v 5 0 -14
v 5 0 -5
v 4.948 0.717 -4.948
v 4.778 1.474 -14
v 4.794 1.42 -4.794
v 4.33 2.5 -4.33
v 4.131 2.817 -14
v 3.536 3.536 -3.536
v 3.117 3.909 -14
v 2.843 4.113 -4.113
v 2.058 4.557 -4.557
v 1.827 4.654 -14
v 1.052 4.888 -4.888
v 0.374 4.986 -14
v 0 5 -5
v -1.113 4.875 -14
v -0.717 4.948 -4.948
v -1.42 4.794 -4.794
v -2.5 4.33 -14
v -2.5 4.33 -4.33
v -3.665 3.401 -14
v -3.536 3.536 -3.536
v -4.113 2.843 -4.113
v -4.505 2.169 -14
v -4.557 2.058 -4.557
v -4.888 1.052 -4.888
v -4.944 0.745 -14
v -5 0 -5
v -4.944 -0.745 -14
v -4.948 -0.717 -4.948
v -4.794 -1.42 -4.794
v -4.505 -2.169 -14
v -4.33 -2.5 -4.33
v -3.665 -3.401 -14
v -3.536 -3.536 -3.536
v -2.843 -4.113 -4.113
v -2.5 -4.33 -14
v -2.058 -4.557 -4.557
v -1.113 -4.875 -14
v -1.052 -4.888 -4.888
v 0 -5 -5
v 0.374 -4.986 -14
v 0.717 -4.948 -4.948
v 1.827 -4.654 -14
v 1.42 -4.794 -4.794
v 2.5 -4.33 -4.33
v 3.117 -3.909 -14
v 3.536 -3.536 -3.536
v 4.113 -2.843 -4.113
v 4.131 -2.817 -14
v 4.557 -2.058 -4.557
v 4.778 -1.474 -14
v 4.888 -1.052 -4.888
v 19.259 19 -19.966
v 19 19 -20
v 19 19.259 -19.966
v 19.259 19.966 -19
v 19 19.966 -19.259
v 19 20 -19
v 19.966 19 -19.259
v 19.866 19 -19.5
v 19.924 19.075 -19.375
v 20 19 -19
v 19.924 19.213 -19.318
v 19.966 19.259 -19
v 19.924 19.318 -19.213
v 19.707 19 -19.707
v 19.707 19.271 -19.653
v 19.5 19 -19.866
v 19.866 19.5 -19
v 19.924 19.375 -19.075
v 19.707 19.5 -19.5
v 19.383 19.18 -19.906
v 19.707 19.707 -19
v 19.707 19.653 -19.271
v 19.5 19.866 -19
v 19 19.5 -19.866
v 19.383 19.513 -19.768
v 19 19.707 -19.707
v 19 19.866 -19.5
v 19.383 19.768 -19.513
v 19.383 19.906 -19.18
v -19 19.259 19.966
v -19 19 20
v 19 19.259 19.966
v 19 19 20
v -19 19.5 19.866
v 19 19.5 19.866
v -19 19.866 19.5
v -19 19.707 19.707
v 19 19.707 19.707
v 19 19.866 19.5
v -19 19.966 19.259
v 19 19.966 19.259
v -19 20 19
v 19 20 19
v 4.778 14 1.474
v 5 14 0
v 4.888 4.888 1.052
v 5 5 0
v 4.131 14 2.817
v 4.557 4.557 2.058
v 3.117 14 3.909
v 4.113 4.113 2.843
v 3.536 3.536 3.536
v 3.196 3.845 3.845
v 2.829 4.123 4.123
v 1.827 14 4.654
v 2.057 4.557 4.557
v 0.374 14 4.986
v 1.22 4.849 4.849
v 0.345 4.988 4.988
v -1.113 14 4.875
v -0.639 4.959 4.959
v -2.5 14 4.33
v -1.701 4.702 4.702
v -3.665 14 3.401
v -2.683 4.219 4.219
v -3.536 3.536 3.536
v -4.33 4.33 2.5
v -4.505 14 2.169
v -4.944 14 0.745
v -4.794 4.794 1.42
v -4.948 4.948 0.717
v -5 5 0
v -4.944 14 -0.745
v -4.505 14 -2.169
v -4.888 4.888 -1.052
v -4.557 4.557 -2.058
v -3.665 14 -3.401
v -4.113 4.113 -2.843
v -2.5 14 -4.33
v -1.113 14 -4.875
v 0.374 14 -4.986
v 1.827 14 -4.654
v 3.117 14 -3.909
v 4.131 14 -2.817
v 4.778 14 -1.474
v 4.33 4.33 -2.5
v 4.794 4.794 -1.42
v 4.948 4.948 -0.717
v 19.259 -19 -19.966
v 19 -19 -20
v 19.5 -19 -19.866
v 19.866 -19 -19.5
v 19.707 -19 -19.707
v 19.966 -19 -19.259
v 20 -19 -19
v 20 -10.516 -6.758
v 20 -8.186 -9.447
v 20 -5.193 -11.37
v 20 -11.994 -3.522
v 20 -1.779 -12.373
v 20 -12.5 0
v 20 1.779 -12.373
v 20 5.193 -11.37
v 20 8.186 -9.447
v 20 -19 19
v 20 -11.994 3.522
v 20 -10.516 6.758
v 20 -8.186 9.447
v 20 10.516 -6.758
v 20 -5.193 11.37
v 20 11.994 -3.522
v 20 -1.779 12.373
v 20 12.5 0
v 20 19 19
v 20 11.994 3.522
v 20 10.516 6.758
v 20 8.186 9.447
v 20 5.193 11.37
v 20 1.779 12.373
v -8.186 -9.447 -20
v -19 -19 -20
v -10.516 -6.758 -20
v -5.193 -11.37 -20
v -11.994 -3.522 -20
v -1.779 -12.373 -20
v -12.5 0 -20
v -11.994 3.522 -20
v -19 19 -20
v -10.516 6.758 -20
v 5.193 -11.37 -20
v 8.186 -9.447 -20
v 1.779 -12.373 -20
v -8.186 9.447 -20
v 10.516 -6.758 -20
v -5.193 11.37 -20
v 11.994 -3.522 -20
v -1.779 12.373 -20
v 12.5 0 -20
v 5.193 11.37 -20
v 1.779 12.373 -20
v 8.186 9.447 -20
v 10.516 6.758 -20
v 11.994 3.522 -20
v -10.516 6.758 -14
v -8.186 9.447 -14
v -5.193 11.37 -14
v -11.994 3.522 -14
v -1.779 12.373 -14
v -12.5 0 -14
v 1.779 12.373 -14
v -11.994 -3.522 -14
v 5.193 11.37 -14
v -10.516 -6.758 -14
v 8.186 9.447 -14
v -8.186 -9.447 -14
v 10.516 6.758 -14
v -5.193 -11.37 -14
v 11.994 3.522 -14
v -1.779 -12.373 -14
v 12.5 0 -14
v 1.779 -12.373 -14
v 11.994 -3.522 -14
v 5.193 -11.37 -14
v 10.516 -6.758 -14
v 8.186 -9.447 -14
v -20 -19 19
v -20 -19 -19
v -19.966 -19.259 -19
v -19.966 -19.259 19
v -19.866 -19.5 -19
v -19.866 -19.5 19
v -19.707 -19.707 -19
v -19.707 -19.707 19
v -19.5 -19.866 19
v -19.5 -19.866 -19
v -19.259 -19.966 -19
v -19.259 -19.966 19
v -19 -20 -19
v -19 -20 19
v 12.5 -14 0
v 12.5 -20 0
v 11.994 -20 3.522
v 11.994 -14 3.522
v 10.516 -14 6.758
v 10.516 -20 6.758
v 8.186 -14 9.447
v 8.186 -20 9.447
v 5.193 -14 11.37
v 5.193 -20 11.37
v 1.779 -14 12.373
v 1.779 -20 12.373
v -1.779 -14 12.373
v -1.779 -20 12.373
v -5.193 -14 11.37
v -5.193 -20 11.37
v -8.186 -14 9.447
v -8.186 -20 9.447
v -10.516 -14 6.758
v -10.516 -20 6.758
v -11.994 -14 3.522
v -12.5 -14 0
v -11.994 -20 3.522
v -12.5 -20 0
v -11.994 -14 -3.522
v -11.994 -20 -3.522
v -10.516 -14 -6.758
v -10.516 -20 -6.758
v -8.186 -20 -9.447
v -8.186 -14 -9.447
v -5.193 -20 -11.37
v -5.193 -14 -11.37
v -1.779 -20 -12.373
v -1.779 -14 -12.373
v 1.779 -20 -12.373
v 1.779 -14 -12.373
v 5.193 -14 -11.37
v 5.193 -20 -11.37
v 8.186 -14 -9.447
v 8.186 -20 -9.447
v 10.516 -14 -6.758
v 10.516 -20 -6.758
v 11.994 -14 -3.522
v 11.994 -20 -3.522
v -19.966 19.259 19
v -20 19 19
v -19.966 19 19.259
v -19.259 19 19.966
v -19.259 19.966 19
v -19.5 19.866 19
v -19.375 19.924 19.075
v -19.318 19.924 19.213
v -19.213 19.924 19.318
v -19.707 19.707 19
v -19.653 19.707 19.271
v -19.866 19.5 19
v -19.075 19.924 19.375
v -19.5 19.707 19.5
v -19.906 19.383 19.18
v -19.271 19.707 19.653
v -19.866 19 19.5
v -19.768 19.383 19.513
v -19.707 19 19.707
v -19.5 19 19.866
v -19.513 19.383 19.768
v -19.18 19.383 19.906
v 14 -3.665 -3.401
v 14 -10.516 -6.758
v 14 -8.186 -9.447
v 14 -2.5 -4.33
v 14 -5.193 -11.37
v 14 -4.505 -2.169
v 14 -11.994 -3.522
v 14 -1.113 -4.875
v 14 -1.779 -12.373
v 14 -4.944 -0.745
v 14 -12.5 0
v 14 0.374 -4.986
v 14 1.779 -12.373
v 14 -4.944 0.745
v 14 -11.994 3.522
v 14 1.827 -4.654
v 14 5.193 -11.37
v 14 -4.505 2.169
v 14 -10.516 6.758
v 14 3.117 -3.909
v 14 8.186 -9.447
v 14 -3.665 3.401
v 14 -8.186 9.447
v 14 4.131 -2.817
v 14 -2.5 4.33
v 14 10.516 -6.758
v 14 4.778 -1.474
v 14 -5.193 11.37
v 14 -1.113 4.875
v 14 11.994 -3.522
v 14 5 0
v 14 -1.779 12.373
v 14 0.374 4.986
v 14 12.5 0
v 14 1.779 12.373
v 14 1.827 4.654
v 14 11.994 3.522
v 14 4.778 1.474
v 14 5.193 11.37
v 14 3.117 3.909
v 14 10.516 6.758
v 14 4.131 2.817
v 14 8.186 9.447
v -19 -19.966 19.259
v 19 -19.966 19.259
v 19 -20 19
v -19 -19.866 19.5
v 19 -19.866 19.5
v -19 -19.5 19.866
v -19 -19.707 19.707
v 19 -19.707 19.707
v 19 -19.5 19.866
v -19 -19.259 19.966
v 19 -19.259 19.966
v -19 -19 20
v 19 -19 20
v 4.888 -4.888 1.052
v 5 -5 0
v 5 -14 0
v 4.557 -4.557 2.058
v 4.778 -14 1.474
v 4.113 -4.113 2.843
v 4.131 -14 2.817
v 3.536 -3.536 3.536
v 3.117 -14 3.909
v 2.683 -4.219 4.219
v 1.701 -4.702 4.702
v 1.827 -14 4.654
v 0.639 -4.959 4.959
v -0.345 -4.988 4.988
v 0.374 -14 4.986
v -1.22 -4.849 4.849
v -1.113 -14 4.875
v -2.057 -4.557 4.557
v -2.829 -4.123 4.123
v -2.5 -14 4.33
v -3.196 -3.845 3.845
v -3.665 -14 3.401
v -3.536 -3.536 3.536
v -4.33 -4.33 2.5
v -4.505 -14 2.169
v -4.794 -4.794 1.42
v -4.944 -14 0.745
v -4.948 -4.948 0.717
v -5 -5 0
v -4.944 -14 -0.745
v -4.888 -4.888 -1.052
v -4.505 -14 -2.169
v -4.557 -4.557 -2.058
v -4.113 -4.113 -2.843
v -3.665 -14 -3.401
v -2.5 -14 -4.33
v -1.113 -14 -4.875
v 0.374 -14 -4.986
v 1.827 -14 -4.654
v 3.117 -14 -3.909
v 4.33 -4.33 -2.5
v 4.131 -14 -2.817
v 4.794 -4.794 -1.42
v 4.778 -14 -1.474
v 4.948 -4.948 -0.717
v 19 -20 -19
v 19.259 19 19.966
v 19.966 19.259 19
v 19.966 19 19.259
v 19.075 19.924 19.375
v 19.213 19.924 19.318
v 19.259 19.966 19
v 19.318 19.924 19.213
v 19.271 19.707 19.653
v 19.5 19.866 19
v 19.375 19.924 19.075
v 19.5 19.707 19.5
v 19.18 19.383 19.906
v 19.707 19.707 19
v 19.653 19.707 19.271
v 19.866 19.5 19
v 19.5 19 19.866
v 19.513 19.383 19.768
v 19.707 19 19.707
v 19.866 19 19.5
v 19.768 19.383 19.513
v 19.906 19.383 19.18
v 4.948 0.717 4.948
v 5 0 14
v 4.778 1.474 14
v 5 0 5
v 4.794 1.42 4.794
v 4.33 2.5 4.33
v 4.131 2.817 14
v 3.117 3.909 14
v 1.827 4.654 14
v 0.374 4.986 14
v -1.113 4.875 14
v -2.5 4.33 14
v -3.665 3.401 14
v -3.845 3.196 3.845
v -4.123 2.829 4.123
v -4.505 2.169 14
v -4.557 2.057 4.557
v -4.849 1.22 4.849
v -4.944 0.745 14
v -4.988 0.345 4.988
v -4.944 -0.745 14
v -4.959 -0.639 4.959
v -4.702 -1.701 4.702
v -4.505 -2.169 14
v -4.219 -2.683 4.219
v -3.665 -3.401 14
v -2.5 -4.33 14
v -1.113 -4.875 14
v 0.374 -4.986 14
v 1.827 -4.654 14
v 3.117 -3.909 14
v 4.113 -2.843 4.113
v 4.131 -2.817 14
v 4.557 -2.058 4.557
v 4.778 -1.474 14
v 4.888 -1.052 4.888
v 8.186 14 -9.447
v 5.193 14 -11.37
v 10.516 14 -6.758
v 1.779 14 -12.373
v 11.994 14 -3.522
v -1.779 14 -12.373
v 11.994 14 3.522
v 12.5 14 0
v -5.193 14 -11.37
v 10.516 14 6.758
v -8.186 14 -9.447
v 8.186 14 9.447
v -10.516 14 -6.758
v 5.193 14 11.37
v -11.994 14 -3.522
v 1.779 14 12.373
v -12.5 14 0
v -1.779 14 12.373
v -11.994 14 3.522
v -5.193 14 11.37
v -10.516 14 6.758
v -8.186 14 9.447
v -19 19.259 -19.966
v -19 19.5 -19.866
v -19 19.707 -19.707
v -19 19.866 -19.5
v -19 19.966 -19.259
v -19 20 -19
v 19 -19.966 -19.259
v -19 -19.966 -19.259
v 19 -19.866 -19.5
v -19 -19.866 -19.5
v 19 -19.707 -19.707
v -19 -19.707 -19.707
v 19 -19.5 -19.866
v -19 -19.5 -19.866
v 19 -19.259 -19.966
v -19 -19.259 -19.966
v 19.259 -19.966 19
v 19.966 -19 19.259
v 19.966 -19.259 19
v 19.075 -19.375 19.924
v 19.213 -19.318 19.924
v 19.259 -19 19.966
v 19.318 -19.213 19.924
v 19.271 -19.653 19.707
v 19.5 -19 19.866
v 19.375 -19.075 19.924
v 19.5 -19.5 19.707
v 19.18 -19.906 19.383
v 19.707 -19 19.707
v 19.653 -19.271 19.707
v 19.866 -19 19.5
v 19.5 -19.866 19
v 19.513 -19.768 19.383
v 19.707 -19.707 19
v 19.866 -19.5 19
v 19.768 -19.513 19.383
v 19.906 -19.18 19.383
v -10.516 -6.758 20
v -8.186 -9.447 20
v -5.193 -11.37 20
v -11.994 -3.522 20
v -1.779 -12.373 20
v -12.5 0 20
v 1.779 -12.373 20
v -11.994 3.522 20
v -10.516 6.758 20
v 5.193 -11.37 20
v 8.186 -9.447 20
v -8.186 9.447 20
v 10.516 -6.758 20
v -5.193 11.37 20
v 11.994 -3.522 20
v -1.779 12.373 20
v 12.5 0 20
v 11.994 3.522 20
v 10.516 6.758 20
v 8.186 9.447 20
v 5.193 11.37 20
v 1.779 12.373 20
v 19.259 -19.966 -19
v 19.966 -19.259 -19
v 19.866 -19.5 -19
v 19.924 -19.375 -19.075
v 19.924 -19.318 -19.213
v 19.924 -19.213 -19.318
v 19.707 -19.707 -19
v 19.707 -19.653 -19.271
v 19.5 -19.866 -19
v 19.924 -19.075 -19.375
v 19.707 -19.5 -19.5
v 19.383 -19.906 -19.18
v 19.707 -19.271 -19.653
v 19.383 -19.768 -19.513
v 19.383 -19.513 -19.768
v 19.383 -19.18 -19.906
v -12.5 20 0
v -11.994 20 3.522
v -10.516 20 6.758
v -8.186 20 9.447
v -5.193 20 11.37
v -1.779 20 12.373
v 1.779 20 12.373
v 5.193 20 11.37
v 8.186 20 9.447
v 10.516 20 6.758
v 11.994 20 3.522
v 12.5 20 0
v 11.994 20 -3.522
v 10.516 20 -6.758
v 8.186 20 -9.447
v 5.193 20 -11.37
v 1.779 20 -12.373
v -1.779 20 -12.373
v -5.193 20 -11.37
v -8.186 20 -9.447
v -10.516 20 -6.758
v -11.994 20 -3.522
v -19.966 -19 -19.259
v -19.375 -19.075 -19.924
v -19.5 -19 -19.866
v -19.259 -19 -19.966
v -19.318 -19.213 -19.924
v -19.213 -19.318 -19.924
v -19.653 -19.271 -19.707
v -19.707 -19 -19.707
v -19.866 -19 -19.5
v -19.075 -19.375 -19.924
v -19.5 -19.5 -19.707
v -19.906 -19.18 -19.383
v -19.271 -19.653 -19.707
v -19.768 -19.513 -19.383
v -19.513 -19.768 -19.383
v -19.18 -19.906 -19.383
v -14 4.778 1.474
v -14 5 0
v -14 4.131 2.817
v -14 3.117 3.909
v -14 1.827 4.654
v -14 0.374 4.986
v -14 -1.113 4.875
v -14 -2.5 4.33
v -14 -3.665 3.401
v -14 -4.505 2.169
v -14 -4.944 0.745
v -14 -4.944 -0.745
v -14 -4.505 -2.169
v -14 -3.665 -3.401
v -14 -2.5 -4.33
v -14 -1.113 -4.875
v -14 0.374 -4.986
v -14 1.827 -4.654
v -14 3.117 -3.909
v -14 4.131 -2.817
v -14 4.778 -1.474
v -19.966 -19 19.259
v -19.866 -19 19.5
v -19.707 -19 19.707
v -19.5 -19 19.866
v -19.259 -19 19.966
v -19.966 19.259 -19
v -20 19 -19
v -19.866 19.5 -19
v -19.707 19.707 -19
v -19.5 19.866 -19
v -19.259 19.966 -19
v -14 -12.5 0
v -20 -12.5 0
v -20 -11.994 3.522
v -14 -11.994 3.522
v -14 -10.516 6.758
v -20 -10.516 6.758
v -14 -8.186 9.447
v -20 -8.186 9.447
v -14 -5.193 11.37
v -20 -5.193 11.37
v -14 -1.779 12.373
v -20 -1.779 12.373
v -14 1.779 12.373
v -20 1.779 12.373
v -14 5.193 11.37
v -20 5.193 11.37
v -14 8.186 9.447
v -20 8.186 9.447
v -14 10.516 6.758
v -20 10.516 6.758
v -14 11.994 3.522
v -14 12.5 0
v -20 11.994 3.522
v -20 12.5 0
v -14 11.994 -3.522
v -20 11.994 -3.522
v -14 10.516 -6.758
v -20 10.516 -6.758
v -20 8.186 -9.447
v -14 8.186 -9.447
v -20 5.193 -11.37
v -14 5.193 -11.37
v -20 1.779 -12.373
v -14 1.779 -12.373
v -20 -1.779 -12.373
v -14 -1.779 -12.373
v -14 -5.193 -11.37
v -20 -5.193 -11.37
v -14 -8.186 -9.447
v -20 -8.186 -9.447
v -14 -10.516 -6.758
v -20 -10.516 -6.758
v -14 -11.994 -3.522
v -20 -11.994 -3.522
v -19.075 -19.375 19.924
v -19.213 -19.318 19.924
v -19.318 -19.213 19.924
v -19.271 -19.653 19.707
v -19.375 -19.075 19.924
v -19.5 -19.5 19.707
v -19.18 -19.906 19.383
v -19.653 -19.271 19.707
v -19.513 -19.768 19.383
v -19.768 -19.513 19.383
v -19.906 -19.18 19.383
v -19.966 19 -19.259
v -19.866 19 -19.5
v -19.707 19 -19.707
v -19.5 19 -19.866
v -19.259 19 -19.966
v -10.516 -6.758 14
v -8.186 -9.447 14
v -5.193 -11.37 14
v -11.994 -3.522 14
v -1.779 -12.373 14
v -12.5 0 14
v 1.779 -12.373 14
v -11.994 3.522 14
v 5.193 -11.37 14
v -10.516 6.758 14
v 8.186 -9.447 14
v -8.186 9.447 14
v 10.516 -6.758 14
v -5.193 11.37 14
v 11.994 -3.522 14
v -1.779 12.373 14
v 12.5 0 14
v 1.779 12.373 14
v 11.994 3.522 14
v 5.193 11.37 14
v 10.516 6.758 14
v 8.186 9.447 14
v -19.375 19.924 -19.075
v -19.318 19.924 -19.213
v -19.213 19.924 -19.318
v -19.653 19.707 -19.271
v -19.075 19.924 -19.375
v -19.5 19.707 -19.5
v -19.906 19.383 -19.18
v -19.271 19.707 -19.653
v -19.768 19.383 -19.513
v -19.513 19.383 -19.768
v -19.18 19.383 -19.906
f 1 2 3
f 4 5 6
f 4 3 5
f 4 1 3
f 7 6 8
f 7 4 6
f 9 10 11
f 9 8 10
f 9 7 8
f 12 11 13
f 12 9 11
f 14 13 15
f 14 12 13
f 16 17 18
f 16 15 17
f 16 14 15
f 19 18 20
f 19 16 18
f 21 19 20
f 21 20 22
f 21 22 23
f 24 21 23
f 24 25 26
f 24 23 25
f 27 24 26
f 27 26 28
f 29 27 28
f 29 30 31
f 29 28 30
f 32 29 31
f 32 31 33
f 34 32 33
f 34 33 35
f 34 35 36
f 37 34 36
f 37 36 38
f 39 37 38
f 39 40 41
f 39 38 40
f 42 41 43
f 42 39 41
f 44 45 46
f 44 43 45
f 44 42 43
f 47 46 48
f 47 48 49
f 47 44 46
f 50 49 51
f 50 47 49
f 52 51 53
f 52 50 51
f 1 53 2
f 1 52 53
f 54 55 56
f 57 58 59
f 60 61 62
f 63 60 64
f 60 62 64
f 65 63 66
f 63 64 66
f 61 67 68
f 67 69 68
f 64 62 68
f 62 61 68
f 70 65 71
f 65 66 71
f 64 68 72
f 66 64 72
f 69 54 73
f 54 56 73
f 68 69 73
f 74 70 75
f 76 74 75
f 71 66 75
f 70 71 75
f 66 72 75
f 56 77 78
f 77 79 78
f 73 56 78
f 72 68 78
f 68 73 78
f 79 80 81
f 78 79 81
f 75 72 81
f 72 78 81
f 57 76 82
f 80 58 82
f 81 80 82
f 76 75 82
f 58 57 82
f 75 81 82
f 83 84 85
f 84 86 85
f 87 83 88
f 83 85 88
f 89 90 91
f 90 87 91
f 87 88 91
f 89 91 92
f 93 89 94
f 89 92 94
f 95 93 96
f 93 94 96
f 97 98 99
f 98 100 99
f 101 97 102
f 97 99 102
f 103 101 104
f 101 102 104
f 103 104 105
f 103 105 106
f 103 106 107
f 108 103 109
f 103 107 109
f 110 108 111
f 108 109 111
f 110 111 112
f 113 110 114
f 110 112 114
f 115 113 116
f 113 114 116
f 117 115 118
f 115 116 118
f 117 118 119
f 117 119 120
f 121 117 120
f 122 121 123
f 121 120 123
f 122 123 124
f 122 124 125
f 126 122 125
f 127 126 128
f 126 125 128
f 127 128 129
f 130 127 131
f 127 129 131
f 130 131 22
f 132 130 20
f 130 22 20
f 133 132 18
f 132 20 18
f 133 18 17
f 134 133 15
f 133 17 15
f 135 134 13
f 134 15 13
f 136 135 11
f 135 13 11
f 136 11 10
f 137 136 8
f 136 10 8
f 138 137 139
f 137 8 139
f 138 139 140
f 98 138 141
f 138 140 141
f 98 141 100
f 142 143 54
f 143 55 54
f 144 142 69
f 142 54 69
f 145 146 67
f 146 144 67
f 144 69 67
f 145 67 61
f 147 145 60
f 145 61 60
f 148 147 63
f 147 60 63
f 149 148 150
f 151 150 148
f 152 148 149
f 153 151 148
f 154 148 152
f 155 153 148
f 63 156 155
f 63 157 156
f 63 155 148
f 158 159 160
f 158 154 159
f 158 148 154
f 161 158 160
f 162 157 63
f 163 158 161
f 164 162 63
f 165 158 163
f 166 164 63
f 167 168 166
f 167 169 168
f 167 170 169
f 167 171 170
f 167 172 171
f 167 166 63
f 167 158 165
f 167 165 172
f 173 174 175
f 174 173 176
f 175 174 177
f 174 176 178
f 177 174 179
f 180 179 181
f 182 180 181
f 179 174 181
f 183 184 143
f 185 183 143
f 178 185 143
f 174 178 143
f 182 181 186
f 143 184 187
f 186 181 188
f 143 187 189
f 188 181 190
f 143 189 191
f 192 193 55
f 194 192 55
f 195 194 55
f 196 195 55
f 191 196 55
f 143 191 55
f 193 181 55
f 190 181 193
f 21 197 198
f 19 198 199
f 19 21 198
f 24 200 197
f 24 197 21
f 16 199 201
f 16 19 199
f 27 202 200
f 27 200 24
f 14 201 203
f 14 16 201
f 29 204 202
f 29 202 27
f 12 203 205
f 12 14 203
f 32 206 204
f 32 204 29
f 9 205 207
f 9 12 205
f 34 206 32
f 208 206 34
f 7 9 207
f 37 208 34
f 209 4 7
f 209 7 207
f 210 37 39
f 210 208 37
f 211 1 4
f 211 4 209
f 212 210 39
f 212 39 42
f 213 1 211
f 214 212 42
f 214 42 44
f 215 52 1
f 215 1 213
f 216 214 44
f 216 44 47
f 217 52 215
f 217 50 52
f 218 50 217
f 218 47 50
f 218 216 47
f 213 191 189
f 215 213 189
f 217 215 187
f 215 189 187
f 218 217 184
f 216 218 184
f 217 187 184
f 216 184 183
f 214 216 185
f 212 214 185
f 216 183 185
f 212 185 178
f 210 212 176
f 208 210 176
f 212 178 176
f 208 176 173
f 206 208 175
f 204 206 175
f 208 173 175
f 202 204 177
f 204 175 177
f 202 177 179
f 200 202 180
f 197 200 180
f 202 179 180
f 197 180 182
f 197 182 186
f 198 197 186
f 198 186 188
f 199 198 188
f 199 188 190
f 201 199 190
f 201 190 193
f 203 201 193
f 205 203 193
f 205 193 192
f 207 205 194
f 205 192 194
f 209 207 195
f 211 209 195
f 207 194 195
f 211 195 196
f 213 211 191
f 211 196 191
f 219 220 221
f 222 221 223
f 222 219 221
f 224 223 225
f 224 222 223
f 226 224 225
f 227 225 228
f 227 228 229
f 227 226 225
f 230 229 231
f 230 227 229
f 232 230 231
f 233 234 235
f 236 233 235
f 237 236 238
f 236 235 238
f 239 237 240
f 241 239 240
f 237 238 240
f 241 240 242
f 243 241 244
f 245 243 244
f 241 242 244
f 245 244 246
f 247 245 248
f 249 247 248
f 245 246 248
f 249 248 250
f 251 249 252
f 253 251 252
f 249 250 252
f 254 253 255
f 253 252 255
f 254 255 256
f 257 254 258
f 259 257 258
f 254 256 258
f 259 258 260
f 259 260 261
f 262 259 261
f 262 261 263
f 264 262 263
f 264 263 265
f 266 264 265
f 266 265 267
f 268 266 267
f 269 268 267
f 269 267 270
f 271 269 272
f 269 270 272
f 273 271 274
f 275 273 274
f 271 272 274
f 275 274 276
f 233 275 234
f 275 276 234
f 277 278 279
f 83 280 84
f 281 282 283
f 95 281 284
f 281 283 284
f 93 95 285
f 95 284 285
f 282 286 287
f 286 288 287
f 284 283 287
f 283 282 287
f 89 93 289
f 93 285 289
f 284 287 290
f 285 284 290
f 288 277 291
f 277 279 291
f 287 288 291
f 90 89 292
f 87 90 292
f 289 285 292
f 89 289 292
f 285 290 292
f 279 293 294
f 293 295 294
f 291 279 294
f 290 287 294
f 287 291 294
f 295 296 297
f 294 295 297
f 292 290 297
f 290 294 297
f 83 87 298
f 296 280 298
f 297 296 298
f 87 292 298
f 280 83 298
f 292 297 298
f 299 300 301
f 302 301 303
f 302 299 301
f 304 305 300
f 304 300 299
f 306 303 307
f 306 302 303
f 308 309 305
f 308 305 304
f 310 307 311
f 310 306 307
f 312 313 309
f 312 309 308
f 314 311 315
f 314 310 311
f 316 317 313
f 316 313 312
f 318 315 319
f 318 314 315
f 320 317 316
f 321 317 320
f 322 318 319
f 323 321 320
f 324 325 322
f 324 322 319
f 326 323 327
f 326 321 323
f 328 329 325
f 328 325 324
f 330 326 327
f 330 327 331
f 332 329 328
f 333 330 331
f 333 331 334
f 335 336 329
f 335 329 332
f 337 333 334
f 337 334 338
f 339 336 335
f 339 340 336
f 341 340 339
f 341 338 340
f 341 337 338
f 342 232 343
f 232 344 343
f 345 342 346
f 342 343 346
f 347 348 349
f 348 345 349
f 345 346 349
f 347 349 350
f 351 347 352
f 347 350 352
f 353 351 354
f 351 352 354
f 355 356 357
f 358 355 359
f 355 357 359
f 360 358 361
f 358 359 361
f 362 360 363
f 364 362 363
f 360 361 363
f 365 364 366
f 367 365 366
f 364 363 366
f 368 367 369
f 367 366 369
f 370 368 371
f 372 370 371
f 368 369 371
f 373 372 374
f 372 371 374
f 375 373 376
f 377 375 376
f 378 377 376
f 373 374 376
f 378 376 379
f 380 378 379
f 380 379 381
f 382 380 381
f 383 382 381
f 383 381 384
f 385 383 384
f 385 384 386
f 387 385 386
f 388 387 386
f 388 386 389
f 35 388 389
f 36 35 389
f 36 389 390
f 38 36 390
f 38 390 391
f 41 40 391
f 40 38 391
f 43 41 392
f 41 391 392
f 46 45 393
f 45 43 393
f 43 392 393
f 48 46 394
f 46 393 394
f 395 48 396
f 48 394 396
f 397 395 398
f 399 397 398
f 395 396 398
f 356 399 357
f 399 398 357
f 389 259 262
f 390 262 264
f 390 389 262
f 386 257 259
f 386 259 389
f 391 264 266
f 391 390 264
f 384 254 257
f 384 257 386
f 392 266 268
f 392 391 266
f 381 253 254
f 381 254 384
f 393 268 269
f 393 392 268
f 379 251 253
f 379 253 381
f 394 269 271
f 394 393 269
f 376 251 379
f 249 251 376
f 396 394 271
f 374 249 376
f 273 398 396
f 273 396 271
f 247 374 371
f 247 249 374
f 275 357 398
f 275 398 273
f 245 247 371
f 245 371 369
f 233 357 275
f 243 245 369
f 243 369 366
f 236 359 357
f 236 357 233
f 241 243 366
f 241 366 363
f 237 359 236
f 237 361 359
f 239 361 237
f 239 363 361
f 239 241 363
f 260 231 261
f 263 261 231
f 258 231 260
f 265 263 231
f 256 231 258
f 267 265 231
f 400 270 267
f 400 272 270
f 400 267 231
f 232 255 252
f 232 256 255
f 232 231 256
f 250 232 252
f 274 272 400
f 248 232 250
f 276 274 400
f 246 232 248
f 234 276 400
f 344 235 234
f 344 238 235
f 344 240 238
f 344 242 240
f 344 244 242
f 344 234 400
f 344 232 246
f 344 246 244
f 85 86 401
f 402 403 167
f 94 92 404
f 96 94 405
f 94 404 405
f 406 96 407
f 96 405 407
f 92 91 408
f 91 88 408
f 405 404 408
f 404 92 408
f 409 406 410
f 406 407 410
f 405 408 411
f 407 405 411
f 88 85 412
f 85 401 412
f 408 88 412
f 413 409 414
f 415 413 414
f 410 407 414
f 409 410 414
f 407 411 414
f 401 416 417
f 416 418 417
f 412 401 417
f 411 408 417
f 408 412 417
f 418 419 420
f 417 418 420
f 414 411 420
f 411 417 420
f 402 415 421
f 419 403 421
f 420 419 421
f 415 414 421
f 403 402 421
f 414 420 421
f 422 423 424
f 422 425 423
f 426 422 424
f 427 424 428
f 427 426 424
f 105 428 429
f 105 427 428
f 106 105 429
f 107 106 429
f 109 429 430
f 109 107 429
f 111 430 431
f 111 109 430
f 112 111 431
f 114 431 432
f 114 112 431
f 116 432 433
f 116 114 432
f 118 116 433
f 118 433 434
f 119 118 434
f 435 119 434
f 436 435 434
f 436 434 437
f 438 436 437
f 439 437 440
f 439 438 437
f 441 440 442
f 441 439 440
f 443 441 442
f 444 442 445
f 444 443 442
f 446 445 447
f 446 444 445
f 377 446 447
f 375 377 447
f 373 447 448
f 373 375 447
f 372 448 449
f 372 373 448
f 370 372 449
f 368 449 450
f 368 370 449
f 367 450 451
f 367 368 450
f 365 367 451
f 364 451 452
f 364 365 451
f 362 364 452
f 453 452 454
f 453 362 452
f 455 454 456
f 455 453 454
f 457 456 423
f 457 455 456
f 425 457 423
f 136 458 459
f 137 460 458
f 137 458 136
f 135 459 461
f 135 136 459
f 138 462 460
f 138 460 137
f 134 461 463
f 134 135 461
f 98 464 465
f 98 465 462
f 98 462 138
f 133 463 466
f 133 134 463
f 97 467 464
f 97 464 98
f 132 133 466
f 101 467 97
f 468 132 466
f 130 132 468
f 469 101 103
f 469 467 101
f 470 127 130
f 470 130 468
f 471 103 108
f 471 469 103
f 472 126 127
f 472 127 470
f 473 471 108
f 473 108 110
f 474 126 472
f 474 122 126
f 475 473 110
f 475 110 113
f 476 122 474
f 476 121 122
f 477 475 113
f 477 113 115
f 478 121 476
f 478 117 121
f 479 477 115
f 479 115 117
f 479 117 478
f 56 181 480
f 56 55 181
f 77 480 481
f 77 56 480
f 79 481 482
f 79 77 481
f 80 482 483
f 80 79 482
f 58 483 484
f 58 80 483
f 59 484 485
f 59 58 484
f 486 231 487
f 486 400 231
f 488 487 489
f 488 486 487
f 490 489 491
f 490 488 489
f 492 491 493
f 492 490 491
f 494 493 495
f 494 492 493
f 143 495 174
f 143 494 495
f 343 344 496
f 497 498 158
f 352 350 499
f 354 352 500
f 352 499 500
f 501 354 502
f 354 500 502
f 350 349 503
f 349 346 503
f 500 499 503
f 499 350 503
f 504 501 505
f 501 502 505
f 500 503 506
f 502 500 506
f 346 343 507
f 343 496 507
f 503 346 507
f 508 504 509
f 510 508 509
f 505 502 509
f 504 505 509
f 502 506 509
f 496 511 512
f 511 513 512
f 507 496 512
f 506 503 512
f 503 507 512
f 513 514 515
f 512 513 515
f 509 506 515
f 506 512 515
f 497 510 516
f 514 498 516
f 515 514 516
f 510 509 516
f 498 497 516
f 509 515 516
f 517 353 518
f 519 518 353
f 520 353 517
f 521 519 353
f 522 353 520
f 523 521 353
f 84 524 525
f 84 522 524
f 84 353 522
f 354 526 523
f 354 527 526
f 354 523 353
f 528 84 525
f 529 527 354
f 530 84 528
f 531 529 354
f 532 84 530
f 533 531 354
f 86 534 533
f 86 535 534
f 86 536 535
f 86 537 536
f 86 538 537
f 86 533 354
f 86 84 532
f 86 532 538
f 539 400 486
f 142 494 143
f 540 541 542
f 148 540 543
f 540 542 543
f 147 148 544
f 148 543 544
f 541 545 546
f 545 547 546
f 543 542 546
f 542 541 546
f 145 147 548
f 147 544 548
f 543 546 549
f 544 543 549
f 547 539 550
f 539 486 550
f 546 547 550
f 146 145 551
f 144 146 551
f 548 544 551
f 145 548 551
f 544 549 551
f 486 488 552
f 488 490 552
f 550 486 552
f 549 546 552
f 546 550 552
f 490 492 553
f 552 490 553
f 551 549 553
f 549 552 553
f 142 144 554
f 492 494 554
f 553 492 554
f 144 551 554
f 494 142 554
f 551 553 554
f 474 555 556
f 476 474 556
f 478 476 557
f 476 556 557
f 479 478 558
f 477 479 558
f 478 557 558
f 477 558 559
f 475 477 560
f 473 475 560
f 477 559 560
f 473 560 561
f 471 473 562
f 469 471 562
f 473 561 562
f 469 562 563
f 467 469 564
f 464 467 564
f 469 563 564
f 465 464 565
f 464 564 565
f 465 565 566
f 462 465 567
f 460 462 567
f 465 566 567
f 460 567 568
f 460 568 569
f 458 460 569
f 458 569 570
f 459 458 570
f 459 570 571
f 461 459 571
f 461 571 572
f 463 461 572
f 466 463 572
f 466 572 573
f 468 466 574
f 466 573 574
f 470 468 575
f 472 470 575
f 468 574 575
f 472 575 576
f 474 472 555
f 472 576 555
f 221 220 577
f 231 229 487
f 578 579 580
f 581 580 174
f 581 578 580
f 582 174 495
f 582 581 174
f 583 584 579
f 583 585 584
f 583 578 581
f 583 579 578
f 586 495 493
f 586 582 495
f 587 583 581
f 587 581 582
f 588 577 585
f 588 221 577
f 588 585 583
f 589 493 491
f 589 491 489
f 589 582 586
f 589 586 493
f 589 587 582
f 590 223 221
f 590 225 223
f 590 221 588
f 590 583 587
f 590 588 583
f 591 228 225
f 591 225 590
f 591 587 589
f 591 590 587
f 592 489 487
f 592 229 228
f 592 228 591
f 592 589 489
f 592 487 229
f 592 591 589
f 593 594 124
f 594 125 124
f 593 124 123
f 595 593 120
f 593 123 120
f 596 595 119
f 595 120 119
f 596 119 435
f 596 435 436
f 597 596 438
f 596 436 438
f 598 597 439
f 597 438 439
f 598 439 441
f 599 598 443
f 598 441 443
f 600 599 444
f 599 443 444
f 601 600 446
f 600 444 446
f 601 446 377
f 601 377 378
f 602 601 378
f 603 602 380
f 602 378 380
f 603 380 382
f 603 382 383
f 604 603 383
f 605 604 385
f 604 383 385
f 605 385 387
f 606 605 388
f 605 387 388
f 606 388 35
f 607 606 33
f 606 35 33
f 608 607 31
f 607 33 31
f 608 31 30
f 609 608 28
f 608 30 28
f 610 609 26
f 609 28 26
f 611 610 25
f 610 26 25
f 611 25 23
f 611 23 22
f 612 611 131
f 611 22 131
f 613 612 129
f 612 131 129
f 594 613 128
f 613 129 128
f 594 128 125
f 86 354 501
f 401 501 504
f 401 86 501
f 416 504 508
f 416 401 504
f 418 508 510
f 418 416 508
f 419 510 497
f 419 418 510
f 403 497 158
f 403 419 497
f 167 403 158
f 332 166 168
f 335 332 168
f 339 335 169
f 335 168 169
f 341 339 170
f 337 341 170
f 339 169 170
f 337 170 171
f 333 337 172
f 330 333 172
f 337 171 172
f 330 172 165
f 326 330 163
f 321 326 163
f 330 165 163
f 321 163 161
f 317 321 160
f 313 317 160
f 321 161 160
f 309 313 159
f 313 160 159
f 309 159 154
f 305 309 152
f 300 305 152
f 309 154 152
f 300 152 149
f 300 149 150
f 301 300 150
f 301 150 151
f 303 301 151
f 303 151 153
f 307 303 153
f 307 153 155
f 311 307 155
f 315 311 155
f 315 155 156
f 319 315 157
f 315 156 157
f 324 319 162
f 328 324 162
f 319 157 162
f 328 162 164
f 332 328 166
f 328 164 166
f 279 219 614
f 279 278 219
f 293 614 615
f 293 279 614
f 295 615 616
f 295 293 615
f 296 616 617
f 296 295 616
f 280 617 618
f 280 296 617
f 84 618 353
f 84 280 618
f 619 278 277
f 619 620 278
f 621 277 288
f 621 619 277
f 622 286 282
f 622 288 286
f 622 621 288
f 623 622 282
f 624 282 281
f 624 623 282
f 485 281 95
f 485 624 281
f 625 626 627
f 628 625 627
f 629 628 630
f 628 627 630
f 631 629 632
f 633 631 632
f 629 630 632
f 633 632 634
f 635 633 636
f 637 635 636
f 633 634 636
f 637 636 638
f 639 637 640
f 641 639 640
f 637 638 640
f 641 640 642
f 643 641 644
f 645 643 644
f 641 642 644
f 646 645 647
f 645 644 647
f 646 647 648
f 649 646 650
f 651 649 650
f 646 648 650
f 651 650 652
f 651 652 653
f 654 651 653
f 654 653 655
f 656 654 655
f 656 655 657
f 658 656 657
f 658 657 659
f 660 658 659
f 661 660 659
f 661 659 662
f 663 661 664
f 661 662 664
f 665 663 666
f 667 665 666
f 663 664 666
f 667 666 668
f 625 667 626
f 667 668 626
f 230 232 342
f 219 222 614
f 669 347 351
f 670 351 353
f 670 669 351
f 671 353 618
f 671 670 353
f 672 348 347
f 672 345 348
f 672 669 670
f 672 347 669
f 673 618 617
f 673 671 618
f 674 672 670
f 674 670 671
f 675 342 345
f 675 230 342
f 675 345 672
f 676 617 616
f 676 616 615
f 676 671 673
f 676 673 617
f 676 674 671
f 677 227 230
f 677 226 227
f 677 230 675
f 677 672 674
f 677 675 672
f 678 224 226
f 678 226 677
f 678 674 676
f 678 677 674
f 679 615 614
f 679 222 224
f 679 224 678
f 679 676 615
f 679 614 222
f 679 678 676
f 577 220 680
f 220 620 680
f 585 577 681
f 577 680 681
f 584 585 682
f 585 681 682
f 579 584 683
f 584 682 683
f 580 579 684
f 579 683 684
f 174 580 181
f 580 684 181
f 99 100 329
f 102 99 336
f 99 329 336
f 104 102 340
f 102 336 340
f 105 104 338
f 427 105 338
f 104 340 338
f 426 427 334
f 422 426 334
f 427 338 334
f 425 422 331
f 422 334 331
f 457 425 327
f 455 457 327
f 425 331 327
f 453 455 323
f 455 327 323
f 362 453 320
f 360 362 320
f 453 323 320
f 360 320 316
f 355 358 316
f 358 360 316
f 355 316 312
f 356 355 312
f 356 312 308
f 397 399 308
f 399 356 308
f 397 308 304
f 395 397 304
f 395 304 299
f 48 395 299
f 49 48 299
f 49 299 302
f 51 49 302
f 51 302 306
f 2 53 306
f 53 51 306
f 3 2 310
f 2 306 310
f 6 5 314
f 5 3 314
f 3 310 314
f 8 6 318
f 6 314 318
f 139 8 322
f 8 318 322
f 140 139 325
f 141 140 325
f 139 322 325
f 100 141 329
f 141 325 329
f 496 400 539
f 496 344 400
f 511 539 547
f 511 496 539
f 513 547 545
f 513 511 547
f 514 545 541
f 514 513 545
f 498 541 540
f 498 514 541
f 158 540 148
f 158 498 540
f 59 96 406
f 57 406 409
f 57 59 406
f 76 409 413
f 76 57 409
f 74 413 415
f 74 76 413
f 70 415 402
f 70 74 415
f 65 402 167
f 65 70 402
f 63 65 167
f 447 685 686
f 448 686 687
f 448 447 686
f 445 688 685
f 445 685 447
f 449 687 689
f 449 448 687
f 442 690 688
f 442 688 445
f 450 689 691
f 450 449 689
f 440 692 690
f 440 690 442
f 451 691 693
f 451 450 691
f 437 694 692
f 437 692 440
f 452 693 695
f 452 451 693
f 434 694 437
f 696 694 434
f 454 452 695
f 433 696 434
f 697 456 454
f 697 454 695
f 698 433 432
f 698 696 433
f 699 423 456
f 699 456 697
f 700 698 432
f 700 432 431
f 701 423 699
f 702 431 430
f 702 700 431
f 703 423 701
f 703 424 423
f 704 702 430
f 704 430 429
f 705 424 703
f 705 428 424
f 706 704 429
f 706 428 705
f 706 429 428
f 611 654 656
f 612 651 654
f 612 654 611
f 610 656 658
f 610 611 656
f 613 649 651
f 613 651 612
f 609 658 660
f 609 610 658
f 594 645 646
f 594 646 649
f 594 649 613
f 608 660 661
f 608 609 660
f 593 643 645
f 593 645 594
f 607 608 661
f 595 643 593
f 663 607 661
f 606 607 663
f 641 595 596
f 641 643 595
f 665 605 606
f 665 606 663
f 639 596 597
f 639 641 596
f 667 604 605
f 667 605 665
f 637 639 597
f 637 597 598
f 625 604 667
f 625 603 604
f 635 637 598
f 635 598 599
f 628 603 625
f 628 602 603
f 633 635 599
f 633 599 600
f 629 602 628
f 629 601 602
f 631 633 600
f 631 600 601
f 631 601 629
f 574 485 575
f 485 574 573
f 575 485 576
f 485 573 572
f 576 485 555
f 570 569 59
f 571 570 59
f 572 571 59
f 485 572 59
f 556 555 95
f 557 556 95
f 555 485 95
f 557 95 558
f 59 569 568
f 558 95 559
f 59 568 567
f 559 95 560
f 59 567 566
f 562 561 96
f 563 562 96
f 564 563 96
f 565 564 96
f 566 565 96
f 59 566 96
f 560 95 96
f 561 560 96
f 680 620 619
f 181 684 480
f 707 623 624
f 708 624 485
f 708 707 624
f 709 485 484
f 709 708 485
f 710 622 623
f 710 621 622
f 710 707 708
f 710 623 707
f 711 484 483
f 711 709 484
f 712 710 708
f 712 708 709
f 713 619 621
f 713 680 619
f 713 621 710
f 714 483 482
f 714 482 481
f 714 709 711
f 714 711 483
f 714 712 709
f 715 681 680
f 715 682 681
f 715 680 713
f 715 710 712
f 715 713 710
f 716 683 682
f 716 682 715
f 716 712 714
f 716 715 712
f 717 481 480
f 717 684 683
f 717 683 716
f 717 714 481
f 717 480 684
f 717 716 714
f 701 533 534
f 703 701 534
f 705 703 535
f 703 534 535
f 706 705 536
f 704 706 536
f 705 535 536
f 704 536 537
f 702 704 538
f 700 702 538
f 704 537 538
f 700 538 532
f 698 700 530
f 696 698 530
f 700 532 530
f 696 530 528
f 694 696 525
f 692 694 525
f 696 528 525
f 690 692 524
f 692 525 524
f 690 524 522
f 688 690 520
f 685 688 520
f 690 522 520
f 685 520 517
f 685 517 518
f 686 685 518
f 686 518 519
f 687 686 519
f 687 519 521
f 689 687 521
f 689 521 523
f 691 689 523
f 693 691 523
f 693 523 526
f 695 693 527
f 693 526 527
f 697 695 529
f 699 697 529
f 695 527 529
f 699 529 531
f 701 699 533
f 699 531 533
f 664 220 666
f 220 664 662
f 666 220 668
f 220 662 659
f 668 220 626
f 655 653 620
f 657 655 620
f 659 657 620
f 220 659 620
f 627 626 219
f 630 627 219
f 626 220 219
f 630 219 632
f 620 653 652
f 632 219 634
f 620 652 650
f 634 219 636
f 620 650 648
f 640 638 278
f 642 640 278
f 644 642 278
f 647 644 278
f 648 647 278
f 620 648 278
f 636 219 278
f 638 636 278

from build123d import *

# Parameters (mm, degrees)
F0_W      = 40
F0_H      = 40
F0_R      = 5
F1_DEPTH  = 20
F2_R      = 12.5
F3_DEPTH  = 6
F4_R      = 12.5
F5_DEPTH  = 6
F6_R      = 12.5
F7_DEPTH  = 6
F8_R      = 5
F9_DEPTH  = 20
F10_R     = 5
F11_DEPTH = 20
F12_R     = 12.5
F13_DEPTH = 6
F14_R     = 12.5
F15_DEPTH = 6
F16_R     = 12.5
F17_DEPTH = 6
F18_R     = 1


with BuildPart() as f1:
    # F0 (on Top) → F1 (new body, symmetric)
    with BuildSketch(Plane.XY):
        Rectangle(F0_W, F0_H)
        Circle(F0_R, mode=Mode.SUBTRACT)
    extrude(amount=F1_DEPTH, both=True)

    # F2 (on face) → F3 (cut)
    with BuildSketch(Plane.XZ.offset(20)):
        Circle(F2_R)
    extrude(amount=-F3_DEPTH, mode=Mode.SUBTRACT)

    # F4 (on face) → F5 (cut)
    with BuildSketch(Plane.XY.offset(20)):
        Circle(F4_R)
    extrude(amount=-F5_DEPTH, mode=Mode.SUBTRACT)

    # F6 (on face) → F7 (cut)
    with BuildSketch(Plane(origin=(-20, 0, 0), x_dir=(0, -1, 0), z_dir=(-1, 0, 0))):
        Circle(F6_R)
    extrude(amount=-F7_DEPTH, mode=Mode.SUBTRACT)

    # F8 (on Front) → F9 (cut, symmetric)
    with BuildSketch(Plane.XZ):
        Circle(F8_R)
    extrude(amount=F9_DEPTH, both=True, mode=Mode.SUBTRACT)

    # F10 (on Right) → F11 (cut, symmetric)
    with BuildSketch(Plane.YZ):
        Circle(F10_R)
    extrude(amount=F11_DEPTH, both=True, mode=Mode.SUBTRACT)

    # F12 (on face) → F13 (cut)
    with BuildSketch(Plane(origin=(0, 0, -20), x_dir=(1, 0, 0), z_dir=(0, 0, -1))):
        Circle(F12_R)
    extrude(amount=-F13_DEPTH, mode=Mode.SUBTRACT)

    # F14 (on face) → F15 (cut)
    with BuildSketch(Plane.YZ.offset(20)):
        Circle(F14_R)
    extrude(amount=-F15_DEPTH, mode=Mode.SUBTRACT)

    # F16 (on face) → F17 (cut)
    with BuildSketch(Plane(origin=(0, 20, 0), x_dir=(-1, 0, 0), z_dir=(0, 1, 0))):
        Circle(F16_R)
    extrude(amount=-F17_DEPTH, mode=Mode.SUBTRACT)

    # F18
    f18_edges = [f1.edges().sort_by_distance(p)[0] for p in [
        (-20, -20, 0),
        (-20, 0, -20),
        (0, -20, -20),
        (20, -20, 0),
        (0, -20, 20),
        (-20, 0, 20),
        (-20, 20, 0),
        (0, 20, -20),
        (20, 0, -20),
        (20, 0, 20),
        (0, 20, 20),
        (20, 20, 0),
    ]]
    fillet(f18_edges, radius=F18_R)


solid = f1.part
